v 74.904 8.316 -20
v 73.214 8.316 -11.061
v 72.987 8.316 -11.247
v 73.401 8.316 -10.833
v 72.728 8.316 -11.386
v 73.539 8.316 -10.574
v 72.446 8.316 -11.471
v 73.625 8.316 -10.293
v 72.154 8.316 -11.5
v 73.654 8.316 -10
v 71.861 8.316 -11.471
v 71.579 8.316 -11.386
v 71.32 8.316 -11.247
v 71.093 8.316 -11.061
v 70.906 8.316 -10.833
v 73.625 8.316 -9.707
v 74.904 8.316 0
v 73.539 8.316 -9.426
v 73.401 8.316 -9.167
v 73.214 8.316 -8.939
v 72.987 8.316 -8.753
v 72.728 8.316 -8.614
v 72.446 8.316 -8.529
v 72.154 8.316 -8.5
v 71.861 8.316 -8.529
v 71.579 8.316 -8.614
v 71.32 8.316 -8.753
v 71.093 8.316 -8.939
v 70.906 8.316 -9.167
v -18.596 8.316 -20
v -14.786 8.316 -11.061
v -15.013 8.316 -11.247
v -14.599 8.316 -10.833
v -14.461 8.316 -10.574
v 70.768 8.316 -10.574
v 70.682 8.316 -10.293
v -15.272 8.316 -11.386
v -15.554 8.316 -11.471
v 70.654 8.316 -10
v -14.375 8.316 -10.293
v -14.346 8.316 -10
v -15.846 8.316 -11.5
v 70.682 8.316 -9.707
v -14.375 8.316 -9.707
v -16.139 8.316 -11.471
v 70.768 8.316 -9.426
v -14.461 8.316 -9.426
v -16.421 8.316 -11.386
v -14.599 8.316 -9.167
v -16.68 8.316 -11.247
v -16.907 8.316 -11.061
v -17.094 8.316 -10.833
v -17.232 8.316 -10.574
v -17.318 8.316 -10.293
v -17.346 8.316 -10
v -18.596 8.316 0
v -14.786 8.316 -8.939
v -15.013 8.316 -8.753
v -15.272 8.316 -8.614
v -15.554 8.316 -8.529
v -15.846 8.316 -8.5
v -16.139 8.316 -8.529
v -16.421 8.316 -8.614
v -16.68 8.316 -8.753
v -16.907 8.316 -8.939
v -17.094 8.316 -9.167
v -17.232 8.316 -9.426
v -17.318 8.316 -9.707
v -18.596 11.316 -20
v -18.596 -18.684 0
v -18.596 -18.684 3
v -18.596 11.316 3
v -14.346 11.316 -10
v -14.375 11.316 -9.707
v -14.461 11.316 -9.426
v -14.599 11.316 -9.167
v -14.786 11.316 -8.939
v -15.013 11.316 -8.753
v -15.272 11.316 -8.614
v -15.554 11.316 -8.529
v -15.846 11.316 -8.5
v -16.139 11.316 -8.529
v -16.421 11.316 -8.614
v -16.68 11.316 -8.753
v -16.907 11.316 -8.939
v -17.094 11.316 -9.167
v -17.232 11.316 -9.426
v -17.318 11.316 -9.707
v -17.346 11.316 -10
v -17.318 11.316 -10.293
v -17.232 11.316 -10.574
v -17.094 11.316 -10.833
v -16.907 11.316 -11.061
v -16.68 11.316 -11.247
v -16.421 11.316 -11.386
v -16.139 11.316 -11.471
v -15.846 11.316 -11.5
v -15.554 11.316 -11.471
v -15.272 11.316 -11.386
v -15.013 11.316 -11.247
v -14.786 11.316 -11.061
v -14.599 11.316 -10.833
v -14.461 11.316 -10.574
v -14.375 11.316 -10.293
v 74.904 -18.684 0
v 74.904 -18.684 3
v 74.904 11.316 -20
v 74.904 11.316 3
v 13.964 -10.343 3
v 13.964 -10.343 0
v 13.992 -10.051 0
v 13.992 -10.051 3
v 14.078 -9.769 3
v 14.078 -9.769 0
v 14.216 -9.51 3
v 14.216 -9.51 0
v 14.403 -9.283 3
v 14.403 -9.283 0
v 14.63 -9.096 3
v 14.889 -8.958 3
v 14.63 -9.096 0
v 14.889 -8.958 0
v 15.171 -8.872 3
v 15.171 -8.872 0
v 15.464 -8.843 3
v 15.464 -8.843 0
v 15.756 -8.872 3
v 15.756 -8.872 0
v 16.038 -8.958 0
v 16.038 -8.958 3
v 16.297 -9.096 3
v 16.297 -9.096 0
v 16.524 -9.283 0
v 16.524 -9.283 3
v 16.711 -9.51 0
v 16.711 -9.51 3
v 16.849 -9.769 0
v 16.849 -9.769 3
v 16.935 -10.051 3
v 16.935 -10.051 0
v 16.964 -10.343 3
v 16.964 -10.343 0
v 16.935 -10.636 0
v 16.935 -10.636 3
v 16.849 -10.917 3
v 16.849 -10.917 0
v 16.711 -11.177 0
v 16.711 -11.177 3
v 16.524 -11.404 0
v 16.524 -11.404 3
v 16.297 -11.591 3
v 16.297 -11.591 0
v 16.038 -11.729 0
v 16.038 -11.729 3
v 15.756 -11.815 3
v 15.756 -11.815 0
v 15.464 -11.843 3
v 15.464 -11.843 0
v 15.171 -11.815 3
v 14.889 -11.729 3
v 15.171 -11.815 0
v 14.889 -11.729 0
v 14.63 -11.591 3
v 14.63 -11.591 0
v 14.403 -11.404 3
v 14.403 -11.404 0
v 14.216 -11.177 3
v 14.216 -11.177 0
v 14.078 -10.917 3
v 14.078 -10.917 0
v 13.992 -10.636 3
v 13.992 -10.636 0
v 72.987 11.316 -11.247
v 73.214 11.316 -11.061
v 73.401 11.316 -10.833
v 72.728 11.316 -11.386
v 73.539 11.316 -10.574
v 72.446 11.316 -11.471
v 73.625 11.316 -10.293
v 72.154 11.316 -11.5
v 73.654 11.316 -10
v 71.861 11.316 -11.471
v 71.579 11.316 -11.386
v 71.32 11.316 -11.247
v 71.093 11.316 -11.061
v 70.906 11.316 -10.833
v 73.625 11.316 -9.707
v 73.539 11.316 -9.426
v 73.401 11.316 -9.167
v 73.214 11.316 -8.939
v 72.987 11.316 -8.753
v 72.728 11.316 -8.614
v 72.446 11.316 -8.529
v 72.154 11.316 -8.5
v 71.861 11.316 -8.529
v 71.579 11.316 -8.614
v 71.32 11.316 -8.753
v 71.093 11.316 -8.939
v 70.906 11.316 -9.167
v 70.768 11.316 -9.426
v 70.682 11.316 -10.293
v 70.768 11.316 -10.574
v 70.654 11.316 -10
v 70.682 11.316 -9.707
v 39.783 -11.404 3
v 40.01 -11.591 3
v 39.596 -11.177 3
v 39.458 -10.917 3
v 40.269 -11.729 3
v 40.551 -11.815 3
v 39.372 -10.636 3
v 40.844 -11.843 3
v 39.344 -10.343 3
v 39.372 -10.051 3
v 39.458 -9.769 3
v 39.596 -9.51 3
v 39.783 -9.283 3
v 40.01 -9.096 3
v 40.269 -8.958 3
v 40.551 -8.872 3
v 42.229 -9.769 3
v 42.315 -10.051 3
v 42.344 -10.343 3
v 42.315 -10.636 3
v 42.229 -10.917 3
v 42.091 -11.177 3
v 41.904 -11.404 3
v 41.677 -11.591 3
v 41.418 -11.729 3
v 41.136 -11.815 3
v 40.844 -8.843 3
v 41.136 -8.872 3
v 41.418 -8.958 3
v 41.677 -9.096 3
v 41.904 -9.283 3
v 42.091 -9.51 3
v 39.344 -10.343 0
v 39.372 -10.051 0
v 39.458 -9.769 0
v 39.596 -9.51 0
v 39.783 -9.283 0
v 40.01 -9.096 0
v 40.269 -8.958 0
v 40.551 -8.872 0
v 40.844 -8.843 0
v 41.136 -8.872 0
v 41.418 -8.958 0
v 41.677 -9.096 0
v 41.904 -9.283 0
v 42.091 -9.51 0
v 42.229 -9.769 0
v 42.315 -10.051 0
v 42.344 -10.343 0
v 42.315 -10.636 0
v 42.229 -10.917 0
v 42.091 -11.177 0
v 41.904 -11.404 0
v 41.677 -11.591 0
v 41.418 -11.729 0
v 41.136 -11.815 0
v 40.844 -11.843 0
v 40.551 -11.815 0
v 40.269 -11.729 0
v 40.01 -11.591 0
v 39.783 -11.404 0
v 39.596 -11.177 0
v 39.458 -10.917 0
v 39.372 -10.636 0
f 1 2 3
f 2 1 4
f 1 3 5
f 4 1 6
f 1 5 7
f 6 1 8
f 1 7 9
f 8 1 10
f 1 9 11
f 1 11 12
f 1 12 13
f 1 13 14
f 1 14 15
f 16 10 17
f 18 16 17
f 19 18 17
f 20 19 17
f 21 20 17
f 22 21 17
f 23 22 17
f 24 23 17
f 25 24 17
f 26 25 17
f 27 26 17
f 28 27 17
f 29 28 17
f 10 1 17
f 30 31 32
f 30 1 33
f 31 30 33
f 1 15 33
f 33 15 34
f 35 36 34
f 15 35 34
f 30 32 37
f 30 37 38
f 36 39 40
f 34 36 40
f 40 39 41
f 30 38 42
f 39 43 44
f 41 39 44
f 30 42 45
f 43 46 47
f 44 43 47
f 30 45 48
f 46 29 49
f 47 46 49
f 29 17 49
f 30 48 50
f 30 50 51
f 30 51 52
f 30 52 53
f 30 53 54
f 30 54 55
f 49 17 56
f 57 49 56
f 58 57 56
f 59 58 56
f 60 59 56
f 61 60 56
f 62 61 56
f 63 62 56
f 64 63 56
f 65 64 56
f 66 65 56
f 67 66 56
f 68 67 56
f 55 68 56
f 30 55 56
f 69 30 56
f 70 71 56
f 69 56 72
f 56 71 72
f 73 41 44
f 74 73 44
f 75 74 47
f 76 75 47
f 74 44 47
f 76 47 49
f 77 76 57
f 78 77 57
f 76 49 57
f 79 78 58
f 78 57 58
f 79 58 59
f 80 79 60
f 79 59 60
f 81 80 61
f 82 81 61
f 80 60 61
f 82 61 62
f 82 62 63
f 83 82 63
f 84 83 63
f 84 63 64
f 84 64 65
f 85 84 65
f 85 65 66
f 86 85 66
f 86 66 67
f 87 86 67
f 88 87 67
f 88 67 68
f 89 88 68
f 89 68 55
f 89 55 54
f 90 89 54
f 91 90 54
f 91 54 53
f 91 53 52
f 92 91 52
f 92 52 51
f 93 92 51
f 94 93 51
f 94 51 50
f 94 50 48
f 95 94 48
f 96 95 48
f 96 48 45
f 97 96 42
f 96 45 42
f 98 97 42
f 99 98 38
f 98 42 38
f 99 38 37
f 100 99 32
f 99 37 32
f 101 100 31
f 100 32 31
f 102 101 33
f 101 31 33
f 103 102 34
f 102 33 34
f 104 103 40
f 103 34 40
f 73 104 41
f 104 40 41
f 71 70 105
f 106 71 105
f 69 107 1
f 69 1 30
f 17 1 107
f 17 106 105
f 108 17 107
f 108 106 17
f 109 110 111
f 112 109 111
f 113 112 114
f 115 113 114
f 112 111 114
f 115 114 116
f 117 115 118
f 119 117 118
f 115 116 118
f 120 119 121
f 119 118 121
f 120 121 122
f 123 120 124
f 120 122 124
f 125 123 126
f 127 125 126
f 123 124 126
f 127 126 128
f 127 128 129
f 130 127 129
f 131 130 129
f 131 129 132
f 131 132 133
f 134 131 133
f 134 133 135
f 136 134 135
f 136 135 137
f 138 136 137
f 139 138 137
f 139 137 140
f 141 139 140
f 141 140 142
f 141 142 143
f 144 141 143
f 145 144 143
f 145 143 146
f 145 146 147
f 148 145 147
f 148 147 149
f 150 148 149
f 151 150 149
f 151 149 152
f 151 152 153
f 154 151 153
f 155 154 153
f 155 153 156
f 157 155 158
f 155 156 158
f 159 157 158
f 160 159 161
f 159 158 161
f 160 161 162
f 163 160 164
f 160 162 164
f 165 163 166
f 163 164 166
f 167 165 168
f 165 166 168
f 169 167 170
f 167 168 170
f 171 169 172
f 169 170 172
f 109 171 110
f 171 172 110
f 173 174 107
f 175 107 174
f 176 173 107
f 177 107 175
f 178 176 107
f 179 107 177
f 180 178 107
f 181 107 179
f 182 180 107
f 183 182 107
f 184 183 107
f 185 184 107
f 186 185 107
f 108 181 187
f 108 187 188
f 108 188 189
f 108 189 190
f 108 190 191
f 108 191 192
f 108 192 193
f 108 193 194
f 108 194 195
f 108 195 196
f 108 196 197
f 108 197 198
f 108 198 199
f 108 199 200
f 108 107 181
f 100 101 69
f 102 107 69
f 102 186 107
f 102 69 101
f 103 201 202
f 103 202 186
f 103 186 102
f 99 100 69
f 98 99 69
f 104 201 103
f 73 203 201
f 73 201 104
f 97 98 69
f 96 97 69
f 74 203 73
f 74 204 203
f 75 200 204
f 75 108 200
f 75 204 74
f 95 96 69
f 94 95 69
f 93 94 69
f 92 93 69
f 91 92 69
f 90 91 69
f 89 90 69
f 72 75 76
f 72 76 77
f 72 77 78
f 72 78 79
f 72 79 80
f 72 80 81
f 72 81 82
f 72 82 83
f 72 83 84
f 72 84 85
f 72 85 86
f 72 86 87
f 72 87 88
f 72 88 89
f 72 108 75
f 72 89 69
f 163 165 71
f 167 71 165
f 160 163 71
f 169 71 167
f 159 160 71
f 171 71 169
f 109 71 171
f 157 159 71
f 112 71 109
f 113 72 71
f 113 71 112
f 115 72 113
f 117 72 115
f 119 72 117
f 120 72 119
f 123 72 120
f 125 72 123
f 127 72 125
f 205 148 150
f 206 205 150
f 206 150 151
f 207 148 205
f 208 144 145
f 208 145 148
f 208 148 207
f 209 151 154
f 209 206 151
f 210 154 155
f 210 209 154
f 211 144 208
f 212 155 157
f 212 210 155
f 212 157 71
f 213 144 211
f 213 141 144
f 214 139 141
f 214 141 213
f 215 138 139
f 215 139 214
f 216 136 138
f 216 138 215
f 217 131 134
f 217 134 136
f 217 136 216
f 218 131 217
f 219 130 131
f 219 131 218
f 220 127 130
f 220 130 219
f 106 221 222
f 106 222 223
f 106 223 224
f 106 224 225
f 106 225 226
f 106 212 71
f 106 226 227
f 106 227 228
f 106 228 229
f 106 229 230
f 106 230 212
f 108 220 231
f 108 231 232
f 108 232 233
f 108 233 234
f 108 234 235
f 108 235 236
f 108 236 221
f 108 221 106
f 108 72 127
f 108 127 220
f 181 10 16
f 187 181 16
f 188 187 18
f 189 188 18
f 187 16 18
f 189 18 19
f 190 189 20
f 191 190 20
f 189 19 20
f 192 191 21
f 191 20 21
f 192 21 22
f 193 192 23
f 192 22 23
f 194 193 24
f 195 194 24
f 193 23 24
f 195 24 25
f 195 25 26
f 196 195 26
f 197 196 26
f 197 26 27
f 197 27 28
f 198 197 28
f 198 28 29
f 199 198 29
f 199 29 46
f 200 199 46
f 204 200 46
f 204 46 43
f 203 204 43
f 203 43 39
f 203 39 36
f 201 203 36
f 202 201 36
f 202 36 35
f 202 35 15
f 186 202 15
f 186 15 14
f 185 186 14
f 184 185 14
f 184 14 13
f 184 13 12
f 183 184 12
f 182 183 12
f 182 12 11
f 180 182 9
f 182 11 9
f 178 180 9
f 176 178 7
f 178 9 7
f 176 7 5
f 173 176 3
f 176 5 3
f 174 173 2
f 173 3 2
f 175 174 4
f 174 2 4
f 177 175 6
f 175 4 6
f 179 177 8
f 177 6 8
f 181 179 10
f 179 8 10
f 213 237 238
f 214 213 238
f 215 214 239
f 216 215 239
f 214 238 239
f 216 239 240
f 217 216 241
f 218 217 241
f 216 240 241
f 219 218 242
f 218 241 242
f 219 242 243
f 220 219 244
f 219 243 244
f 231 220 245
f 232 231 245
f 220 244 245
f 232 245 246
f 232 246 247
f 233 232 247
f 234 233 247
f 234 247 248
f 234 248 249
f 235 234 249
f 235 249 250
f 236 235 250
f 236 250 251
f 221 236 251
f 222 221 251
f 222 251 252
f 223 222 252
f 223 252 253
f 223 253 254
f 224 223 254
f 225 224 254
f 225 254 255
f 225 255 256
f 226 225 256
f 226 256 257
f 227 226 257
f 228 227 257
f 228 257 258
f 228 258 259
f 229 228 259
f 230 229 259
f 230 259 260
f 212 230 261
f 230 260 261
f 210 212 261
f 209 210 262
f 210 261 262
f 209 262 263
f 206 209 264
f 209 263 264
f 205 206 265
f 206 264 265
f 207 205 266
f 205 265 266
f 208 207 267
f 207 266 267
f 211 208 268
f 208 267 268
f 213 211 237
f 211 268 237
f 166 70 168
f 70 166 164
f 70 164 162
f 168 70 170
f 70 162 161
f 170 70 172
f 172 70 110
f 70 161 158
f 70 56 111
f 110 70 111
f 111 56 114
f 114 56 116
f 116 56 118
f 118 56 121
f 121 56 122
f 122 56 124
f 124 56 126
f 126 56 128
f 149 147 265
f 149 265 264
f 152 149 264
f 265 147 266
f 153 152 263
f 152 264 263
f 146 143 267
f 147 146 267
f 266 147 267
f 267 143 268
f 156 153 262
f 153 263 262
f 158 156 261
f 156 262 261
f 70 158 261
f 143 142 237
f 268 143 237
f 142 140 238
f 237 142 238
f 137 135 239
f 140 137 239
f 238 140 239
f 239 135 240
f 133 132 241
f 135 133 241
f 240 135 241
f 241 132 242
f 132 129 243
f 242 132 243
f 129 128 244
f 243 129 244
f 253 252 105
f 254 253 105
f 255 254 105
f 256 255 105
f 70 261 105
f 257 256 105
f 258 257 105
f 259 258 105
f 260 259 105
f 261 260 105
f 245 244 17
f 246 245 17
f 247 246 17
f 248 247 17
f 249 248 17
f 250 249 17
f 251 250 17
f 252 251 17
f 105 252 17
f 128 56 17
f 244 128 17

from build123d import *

# Parameters (mm, degrees)
SKETCH_1_W          = 93.5
SKETCH_1_H          = 30
EXTRUDE_1_DEPTH     = 3
SKETCH_2_W          = 93.5
SKETCH_2_H          = 3
EXTRUDE_2_DEPTH     = 20
SKETCH_3_R          = 1.5
CUT_EXTRUDE_1_DEPTH = 20
SKETCH_4_R          = 1.5
CUT_EXTRUDE_2_DEPTH = 20


with BuildPart() as part:
    # 草图1 → 凸台-拉伸1 (new body)
    with BuildSketch(Plane.XY):
        with Locations((28.153508772, -3.684210526)):
            Rectangle(SKETCH_1_W, SKETCH_1_H)
    extrude(amount=EXTRUDE_1_DEPTH)

    # 草图2 → 凸台-拉伸2 (add)
    with BuildSketch(Plane(origin=(0, 0, 0), x_dir=(-1, 0, 0), z_dir=(0, 0, -1))):
        with Locations((-28.153508772, 9.815789474)):
            Rectangle(SKETCH_2_W, SKETCH_2_H)
    extrude(amount=EXTRUDE_2_DEPTH)

    # 草图3 → 切除-拉伸1 (cut)
    with BuildSketch(Plane.XZ.offset(-8.315789474)):
        with Locations((-15.846491228, -10)):
            Circle(SKETCH_3_R)
        with Locations((72.153508772, -10)):
            Circle(SKETCH_3_R)
    extrude(amount=-CUT_EXTRUDE_1_DEPTH, mode=Mode.SUBTRACT)

    # 草图4 → 切除-拉伸2 (cut)
    with BuildSketch(Plane(origin=(0, 0, 0), x_dir=(-1, 0, 0), z_dir=(0, 0, -1))):
        with Locations((-40.843508772, -10.343453639)):
            Circle(SKETCH_4_R)
        with Locations((-15.463508772, -10.343453639)):
            Circle(SKETCH_4_R)
    extrude(amount=-CUT_EXTRUDE_2_DEPTH, mode=Mode.SUBTRACT)


solid = part.part
